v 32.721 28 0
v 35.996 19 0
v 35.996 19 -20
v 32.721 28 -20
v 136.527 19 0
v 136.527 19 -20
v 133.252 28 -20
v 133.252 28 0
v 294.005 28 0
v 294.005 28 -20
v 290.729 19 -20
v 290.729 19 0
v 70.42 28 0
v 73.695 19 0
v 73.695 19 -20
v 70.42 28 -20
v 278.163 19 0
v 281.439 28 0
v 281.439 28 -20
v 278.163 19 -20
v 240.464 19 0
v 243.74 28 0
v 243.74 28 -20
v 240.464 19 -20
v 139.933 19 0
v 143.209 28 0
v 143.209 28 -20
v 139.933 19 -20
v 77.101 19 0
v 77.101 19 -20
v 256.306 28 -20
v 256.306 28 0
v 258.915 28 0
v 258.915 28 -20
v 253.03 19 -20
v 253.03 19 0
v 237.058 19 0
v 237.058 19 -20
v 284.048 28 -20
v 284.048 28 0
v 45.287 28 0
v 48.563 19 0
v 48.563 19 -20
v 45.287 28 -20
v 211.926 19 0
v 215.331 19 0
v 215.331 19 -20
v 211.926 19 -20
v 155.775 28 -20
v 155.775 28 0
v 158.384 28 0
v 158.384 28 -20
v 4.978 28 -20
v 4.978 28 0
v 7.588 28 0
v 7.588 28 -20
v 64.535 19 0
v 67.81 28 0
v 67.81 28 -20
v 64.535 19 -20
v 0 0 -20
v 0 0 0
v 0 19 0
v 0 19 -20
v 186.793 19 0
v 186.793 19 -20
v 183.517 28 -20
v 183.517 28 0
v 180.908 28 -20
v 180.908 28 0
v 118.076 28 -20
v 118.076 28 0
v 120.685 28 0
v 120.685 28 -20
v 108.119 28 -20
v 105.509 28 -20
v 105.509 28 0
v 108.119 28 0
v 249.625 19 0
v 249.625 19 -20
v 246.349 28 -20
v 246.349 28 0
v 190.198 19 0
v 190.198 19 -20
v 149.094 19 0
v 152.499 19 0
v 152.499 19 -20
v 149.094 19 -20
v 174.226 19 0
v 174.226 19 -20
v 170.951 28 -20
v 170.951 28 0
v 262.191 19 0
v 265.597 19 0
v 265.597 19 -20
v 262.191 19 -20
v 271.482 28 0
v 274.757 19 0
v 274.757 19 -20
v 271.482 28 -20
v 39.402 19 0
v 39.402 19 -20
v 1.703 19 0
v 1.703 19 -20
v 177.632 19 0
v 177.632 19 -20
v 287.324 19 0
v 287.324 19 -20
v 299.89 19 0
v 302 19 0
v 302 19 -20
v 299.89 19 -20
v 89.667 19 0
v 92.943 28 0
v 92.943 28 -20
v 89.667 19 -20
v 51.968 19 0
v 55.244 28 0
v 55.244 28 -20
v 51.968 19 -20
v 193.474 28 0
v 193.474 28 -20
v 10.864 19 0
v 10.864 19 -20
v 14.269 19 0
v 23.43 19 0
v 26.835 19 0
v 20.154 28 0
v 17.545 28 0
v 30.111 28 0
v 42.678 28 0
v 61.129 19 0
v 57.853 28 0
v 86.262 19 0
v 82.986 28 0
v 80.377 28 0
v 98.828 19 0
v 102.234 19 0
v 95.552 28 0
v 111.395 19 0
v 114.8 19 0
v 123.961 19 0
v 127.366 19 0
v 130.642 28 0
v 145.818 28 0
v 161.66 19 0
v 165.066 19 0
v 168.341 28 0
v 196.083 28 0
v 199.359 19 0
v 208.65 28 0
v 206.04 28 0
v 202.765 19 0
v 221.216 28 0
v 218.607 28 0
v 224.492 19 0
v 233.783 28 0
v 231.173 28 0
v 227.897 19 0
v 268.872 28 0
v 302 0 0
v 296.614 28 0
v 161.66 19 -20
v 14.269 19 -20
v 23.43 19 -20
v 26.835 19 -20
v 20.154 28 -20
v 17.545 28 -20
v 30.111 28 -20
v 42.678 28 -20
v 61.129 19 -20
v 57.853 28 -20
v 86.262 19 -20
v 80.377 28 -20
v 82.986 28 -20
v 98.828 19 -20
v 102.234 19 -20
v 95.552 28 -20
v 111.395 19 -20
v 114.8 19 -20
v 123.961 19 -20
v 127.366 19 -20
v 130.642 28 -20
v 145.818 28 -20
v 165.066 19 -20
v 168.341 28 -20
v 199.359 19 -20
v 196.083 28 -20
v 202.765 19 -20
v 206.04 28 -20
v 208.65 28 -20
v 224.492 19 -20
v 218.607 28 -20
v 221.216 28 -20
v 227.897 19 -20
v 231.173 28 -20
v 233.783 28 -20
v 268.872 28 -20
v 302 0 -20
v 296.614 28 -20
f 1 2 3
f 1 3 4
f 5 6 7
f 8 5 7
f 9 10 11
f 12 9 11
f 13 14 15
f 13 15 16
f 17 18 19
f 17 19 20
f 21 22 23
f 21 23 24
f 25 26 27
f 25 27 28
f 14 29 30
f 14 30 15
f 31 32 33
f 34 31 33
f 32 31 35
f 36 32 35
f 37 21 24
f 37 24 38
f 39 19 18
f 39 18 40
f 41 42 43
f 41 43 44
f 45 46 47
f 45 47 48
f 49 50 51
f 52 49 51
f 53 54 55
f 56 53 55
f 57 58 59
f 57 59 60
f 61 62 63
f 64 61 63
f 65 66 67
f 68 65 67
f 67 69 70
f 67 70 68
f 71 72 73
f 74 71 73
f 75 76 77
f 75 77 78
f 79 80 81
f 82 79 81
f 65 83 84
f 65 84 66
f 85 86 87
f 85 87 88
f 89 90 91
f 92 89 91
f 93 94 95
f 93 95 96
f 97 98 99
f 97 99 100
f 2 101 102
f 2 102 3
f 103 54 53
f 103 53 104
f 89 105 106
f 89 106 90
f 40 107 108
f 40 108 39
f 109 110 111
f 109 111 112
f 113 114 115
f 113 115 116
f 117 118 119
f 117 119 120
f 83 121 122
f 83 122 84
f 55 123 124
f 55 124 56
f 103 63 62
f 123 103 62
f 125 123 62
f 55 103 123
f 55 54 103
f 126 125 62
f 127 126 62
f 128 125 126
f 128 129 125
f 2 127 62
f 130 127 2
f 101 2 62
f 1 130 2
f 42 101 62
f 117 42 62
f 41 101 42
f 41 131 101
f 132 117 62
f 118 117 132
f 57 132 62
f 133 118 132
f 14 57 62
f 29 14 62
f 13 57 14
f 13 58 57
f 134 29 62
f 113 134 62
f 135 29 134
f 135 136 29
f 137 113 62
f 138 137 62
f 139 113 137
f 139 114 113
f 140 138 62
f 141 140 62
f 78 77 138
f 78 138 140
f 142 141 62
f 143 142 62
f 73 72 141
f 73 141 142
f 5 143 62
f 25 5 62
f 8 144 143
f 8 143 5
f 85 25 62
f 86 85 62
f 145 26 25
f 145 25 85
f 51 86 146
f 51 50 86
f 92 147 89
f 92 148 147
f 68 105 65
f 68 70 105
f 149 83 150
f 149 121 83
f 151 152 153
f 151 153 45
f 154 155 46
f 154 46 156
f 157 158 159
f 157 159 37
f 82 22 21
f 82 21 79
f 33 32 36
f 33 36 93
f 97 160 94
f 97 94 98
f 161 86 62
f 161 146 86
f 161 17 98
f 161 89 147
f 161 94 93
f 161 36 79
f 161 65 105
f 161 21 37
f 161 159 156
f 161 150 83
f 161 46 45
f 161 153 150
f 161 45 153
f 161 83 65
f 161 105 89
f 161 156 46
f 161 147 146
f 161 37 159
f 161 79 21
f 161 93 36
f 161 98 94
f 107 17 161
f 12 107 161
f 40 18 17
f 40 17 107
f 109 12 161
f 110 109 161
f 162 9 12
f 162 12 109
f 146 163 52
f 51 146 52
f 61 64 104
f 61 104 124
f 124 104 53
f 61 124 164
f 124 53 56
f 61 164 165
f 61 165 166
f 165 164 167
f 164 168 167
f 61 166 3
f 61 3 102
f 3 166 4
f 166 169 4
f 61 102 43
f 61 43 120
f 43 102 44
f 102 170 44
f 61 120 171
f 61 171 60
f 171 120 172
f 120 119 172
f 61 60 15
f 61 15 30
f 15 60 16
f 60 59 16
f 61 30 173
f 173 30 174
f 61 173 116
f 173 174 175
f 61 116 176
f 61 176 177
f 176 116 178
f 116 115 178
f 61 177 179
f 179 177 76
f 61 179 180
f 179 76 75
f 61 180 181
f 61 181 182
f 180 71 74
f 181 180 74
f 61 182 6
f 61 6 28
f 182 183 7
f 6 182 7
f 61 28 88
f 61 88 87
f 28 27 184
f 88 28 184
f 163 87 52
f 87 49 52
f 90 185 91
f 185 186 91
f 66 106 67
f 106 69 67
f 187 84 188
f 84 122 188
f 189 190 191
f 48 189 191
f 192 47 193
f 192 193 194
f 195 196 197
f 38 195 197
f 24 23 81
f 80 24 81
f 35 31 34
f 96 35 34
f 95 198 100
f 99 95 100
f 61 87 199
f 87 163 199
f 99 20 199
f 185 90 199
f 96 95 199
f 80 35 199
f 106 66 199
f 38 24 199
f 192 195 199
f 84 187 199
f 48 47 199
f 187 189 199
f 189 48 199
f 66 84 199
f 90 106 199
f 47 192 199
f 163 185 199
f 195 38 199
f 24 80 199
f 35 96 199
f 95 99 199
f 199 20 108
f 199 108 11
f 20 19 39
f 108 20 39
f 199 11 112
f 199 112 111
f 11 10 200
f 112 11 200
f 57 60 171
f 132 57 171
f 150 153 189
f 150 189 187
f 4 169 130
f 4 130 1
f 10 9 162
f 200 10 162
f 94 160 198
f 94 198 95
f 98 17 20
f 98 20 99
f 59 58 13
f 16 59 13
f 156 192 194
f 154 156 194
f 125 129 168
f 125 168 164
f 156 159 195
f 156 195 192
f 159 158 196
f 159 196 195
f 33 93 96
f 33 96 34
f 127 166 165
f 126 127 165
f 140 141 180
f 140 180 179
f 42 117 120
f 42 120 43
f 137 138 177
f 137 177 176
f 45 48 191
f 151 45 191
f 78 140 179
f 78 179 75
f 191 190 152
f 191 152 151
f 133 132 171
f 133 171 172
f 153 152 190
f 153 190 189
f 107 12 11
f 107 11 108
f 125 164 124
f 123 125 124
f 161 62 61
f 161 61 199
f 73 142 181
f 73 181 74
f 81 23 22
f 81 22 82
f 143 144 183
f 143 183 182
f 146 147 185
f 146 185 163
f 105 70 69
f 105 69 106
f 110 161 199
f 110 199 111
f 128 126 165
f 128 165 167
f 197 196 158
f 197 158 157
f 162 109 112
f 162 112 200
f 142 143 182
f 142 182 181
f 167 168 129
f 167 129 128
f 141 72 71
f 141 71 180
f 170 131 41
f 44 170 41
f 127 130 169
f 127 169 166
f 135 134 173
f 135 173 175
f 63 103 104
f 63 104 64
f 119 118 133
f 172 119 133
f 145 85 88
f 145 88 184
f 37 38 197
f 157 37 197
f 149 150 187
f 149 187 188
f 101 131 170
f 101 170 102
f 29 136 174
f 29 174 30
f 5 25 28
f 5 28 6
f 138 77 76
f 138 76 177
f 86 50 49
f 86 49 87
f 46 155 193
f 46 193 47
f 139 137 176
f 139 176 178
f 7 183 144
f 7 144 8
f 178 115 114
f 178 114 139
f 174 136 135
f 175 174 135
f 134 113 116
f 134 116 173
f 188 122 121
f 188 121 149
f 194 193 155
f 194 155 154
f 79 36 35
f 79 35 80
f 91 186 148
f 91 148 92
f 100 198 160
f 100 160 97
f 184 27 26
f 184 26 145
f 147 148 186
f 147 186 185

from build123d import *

# Parameters (mm, degrees)
BLANKSKE_W        = 302
BLANKSKE_H        = 28
BLANK_DEPTH       = 20
TOOTHCUTSIM_DEPTH = 304.95394388
TEETHCUTS_COUNT   = 25
TEETHCUTS_PITCH   = 12.5663706


with BuildPart() as part:
    # BlankSke → Blank (new body)
    with BuildSketch(Plane.XY):
        with Locations((151, 14)):
            Rectangle(BLANKSKE_W, BLANKSKE_H)
    extrude(amount=-BLANK_DEPTH)

    # TooCutSkeSim → ToothCutSim (cut, through all)
    with BuildSketch(Plane.XY):
        Polygon((1.702741479, 19), (-1.702741479, 19), (-4.987718431, 28.0254), (4.987718431, 28.0254), align=None)
    toothcutsim = extrude(amount=-TOOTHCUTSIM_DEPTH, mode=Mode.SUBTRACT)

    # TeethCuts: ToothCutSim ×25
    with Locations(*[(i * TEETHCUTS_PITCH, 0, 0) for i in range(1, TEETHCUTS_COUNT)]):
        add(toothcutsim, mode=Mode.SUBTRACT)


solid = part.part
